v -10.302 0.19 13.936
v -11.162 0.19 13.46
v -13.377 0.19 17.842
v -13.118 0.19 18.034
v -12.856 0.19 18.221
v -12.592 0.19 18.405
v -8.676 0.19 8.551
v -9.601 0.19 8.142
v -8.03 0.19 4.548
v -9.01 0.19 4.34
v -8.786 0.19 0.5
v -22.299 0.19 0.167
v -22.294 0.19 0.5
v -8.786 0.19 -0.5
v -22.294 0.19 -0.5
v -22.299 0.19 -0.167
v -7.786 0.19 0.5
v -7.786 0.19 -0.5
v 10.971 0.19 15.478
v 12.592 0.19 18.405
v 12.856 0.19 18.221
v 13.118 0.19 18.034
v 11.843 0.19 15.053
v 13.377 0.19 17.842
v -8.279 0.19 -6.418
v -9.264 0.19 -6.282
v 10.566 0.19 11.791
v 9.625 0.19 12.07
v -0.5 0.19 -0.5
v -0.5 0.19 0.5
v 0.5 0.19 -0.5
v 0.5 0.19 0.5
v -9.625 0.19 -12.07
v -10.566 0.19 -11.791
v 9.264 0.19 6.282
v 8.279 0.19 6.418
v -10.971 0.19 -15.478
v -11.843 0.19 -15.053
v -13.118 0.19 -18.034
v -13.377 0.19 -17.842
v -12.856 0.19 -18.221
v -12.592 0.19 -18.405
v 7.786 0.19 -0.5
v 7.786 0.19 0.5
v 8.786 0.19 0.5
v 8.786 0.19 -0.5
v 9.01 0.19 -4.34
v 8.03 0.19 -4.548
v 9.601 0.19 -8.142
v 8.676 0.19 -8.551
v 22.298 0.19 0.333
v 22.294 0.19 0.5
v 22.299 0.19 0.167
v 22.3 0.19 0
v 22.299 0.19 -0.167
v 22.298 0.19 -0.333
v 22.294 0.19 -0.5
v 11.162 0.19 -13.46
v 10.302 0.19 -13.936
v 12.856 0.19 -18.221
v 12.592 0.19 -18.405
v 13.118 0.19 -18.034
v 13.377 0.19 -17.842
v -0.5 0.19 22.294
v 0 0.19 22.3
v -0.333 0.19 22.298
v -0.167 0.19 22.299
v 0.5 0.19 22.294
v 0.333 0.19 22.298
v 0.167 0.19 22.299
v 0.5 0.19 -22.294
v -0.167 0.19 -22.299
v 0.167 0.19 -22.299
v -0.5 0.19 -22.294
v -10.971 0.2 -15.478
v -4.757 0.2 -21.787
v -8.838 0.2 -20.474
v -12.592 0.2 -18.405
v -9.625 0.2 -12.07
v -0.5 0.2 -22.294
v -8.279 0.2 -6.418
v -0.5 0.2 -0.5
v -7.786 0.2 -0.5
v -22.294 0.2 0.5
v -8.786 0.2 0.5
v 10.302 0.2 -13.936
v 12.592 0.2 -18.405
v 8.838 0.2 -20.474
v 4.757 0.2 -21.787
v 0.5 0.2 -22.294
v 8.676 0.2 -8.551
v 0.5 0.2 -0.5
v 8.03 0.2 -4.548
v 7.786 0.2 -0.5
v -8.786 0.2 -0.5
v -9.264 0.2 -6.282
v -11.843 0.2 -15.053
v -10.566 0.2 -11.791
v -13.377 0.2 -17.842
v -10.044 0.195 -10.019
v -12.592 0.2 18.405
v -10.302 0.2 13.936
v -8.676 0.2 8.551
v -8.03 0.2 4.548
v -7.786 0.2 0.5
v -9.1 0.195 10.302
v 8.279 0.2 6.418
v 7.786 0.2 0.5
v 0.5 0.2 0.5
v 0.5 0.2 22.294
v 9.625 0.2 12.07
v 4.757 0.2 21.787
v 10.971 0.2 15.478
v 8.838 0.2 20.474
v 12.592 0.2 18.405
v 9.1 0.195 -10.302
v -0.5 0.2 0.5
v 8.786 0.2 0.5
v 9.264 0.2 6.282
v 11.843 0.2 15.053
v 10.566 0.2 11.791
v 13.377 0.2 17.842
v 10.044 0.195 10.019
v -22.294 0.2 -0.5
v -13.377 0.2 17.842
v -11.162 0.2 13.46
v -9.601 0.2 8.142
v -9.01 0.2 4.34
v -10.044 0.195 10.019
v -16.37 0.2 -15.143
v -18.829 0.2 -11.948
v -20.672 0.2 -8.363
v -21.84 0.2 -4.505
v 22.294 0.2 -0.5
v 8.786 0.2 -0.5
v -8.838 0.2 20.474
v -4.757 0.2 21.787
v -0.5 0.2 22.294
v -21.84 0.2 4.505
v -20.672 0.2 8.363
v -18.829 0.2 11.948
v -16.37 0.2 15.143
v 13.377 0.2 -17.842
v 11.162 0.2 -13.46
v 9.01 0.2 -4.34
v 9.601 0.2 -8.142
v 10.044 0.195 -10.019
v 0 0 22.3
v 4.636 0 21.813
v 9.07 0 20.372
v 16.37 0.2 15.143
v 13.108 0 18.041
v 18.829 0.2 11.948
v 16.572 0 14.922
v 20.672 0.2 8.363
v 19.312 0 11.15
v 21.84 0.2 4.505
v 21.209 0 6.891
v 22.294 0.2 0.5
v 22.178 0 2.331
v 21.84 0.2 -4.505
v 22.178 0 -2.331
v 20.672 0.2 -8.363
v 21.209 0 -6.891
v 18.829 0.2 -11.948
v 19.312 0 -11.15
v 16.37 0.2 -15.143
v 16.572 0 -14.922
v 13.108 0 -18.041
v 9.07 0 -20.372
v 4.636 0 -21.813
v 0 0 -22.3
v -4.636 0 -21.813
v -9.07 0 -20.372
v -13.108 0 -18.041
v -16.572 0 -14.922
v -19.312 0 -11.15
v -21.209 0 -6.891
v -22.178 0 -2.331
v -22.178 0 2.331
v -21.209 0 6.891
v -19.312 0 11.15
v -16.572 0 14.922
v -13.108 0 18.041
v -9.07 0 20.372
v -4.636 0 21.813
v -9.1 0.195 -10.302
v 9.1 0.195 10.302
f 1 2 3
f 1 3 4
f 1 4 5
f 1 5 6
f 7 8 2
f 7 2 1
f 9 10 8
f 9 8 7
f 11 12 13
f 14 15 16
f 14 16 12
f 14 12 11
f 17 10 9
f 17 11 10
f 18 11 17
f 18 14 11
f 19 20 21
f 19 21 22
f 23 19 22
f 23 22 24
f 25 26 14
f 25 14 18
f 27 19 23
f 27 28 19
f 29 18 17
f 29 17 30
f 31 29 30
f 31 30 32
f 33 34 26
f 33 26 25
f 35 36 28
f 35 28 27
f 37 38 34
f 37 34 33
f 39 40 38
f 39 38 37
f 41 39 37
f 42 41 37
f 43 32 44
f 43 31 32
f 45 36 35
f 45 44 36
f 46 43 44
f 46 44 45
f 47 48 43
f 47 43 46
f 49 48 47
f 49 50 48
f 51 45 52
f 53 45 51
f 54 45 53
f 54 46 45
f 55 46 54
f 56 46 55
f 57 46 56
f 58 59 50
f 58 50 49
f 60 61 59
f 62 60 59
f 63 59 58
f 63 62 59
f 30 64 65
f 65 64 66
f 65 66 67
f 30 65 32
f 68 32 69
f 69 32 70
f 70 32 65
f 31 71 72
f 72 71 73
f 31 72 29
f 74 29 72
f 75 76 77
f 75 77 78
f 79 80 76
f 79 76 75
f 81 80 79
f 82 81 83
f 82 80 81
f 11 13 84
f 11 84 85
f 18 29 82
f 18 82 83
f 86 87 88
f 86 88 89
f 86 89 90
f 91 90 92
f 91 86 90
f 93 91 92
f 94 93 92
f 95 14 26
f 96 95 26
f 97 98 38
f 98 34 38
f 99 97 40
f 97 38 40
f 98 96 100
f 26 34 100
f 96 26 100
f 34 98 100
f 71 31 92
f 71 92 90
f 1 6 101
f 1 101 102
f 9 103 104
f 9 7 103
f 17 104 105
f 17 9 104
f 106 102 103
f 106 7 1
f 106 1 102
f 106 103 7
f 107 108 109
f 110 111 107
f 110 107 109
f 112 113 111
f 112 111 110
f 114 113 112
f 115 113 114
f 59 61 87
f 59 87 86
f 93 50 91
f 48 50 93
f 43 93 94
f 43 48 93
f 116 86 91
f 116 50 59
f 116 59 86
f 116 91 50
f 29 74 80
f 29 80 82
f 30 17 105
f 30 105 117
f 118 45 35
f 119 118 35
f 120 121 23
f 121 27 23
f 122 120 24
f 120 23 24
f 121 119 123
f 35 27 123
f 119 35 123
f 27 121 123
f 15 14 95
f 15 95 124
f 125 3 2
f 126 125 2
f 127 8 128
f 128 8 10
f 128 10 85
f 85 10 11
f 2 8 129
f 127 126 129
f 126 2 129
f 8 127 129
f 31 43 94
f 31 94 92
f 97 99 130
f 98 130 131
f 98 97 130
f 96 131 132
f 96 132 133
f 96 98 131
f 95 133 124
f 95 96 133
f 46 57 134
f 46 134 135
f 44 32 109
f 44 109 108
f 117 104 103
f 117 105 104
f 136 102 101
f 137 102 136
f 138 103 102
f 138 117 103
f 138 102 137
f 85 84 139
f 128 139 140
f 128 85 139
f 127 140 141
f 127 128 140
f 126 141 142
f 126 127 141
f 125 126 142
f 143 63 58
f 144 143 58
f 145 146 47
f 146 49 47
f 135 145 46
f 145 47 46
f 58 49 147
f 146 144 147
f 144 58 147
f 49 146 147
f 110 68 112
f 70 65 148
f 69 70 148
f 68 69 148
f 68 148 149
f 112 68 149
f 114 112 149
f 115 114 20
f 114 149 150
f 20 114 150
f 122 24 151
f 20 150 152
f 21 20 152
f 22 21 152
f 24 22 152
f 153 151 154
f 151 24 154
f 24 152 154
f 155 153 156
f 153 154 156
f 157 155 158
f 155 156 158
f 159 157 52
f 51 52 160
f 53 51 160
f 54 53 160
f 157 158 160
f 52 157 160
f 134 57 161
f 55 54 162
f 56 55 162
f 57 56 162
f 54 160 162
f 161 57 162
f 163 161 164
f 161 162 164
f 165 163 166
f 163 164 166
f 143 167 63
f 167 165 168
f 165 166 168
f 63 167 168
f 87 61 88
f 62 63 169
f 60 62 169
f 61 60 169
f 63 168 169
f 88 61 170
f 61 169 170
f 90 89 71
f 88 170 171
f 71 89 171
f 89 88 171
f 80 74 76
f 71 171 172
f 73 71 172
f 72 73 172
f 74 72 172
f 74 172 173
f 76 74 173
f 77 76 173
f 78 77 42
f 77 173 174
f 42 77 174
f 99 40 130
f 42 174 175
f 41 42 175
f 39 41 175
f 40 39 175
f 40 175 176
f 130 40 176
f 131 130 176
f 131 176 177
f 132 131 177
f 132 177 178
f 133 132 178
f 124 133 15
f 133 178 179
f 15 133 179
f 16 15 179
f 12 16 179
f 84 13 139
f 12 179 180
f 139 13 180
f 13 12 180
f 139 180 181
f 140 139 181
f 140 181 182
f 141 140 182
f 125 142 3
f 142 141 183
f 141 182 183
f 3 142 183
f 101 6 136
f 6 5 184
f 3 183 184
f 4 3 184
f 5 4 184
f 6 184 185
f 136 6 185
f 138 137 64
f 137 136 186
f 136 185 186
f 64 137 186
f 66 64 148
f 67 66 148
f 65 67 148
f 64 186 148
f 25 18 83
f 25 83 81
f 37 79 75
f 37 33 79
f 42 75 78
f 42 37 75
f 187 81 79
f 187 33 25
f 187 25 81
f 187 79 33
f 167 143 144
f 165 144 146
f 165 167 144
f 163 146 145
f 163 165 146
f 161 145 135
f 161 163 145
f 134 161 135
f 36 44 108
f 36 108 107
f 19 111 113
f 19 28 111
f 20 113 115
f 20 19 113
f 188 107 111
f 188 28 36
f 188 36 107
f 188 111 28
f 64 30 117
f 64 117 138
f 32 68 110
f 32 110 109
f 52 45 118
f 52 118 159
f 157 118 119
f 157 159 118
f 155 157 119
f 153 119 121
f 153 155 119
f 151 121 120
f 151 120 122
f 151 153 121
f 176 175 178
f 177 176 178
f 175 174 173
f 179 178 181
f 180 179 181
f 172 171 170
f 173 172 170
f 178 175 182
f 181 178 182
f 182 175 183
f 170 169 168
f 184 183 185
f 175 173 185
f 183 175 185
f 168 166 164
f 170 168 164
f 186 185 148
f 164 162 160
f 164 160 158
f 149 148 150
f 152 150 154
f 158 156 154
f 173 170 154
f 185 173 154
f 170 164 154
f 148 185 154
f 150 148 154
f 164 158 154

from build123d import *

# Parameters (mm, degrees)
SKETCH1_R           = 22.3
BOSS_EXTRUDE1_DEPTH = 0.2
CUT_EXTRUDE1_START  = -0.01
SKETCH2_W           = 1
SKETCH2_H           = 1
CUT_EXTRUDE1_DEPTH  = 0.01


with BuildPart() as part:
    # Sketch1 → Boss-Extrude1 (new body)
    with BuildSketch(Plane(origin=(0, 0, 0), x_dir=(1, 0, 0), z_dir=(0, 1, 0))):
        with Locations(Location((0, 0, 0), (0, 0, 270))):
            Circle(SKETCH1_R)
    extrude(amount=BOSS_EXTRUDE1_DEPTH)

    # Sketch2 → Cut-Extrude1 (cut)
    with BuildSketch(Plane(origin=(0, 0.2, 0), x_dir=(1, 0, 0), z_dir=(0, 1, 0)).offset(CUT_EXTRUDE1_START)):
        with BuildLine():
            add(Edge.make_bspline(
                [(-7.785590959, 0.5), (-7.912713042, 11.228724898), (-12.591992017, 18.404666176)],
                knots=[4.732589507, 4.732589507, 4.732589507, 5.550703884, 5.550703884, 5.550703884], degree=2, weights=[1, 0.917496228, 1]))
            ThreePointArc((-12.591992017, 18.404666176), (-12.987412835, 18.127799311), (-13.376748201, 17.842438386))
            add(Edge.make_bspline(
                [(-8.785624057, 0.5), (-8.910774379, 10.945499623), (-13.376748201, 17.842438386)],
                knots=[4.733440053, 4.733440053, 4.733440053, 5.562190564, 5.562190564, 5.562190564], degree=2, weights=[1, 0.915368033, 1]))
            Line((-8.785624057, 0.5), (-7.785590959, 0.5))
        make_face()
        with BuildLine():
            add(Edge.make_bspline(
                [(-12.591992017, -18.404666176), (-7.912713042, -11.228724898), (-7.785590959, -0.5)],
                knots=[3.874074076, 3.874074076, 3.874074076, 4.692188454, 4.692188454, 4.692188454], degree=2, weights=[1, 0.917496228, 1]))
            Line((-7.785590959, -0.5), (-8.785624057, -0.5))
            add(Edge.make_bspline(
                [(-13.376748201, -17.842438386), (-8.910774379, -10.945499623), (-8.785624057, -0.5)],
                knots=[3.862587397, 3.862587397, 3.862587397, 4.691337908, 4.691337908, 4.691337908], degree=2, weights=[1, 0.915368033, 1]))
            ThreePointArc((-13.376748201, -17.842438386), (-12.987412835, -18.127799311), (-12.591992017, -18.404666176))
        make_face()
        with BuildLine():
            Line((8.785624057, -0.5), (7.785590959, -0.5))
            add(Edge.make_bspline(
                [(7.785590959, -0.5), (7.912713042, -11.228724898), (12.591992017, -18.404666176)],
                knots=[1.590996853, 1.590996853, 1.590996853, 2.409111231, 2.409111231, 2.409111231], degree=2, weights=[1, 0.917496228, 1]))
            ThreePointArc((12.591992017, -18.404666176), (12.987412835, -18.127799311), (13.376748201, -17.842438386))
            add(Edge.make_bspline(
                [(8.785624057, -0.5), (8.910774379, -10.945499623), (13.376748201, -17.842438386)],
                knots=[1.591847399, 1.591847399, 1.591847399, 2.42059791, 2.42059791, 2.42059791], degree=2, weights=[1, 0.915368033, 1]))
        make_face()
        with BuildLine():
            ThreePointArc((13.376748201, 17.842438386), (12.987412835, 18.127799311), (12.591992017, 18.404666176))
            add(Edge.make_bspline(
                [(12.591992017, 18.404666176), (7.912713042, 11.228724898), (7.785590959, 0.5)],
                knots=[0.732481423, 0.732481423, 0.732481423, 1.5505958, 1.5505958, 1.5505958], degree=2, weights=[1, 0.917496228, 1]))
            Line((7.785590959, 0.5), (8.785624057, 0.5))
            add(Edge.make_bspline(
                [(13.376748201, 17.842438386), (8.910774379, 10.945499623), (8.785624057, 0.5)],
                knots=[0.720994743, 0.720994743, 0.720994743, 1.549745255, 1.549745255, 1.549745255], degree=2, weights=[1, 0.915368033, 1]))
        make_face()
        with BuildLine():
            Line((22.294393914, 0.5), (8.785624057, 0.5))
            add(Edge.make_bspline(
                [(8.785624057, 0.5), (8.779633423, 0), (8.785624057, -0.5)],
                knots=[1.549745255, 1.549745255, 1.549745255, 1.591847399, 1.591847399, 1.591847399], degree=2, weights=[1, 0.999778434, 1]))
            Line((8.785624057, -0.5), (22.294393914, -0.5))
            ThreePointArc((22.294393914, -0.5), (22.298598434, -0.250015714), (22.3, 0))
            ThreePointArc((22.3, 0), (22.298598434, 0.250015714), (22.294393914, 0.5))
        make_face()
        with BuildLine():
            Line((8.785624057, 0.5), (7.785590959, 0.5))
            add(Edge.make_bspline(
                [(7.785590959, 0.5), (7.779666579, 0), (7.785590959, -0.5)],
                knots=[1.5505958, 1.5505958, 1.5505958, 1.590996853, 1.590996853, 1.590996853], degree=2, weights=[1, 0.999795976, 1]))
            Line((7.785590959, -0.5), (8.785624057, -0.5))
            add(Edge.make_bspline(
                [(8.785624057, 0.5), (8.779633423, 0), (8.785624057, -0.5)],
                knots=[1.549745255, 1.549745255, 1.549745255, 1.591847399, 1.591847399, 1.591847399], degree=2, weights=[1, 0.999778434, 1]))
        make_face()
        with BuildLine():
            Line((7.785590959, 0.5), (0.5, 0.5))
            Line((0.5, 0.5), (0.5, -0.5))
            Line((0.5, -0.5), (7.785590959, -0.5))
            add(Edge.make_bspline(
                [(7.785590959, 0.5), (7.779666579, 0), (7.785590959, -0.5)],
                knots=[1.5505958, 1.5505958, 1.5505958, 1.590996853, 1.590996853, 1.590996853], degree=2, weights=[1, 0.999795976, 1]))
        make_face()
        Rectangle(SKETCH2_W, SKETCH2_H)
        with BuildLine():
            Line((0.5, -22.294393914), (0.5, -0.5))
            Line((0.5, -0.5), (-0.5, -0.5))
            Line((-0.5, -0.5), (-0.5, -22.294393914))
            ThreePointArc((-0.5, -22.294393914), (0, -22.3), (0.5, -22.294393914))
        make_face()
        with BuildLine():
            Line((0.5, 0.5), (0.5, 22.294393914))
            ThreePointArc((0.5, 22.294393914), (0, 22.3), (-0.5, 22.294393914))
            Line((-0.5, 22.294393914), (-0.5, 0.5))
            Line((-0.5, 0.5), (0.5, 0.5))
        make_face()
        with BuildLine():
            Line((-0.5, -0.5), (-0.5, 0.5))
            Line((-0.5, 0.5), (-7.785590959, 0.5))
            add(Edge.make_bspline(
                [(-7.785590959, -0.5), (-7.779666579, 0), (-7.785590959, 0.5)],
                knots=[4.692188454, 4.692188454, 4.692188454, 4.732589507, 4.732589507, 4.732589507], degree=2, weights=[1, 0.999795976, 1]))
            Line((-7.785590959, -0.5), (-0.5, -0.5))
        make_face()
        with BuildLine():
            add(Edge.make_bspline(
                [(-7.785590959, -0.5), (-7.779666579, 0), (-7.785590959, 0.5)],
                knots=[4.692188454, 4.692188454, 4.692188454, 4.732589507, 4.732589507, 4.732589507], degree=2, weights=[1, 0.999795976, 1]))
            Line((-7.785590959, 0.5), (-8.785624057, 0.5))
            add(Edge.make_bspline(
                [(-8.785624057, -0.5), (-8.779633423, 0), (-8.785624057, 0.5)],
                knots=[4.691337908, 4.691337908, 4.691337908, 4.733440053, 4.733440053, 4.733440053], degree=2, weights=[1, 0.999778434, 1]))
            Line((-8.785624057, -0.5), (-7.785590959, -0.5))
        make_face()
        with BuildLine():
            add(Edge.make_bspline(
                [(-8.785624057, -0.5), (-8.779633423, 0), (-8.785624057, 0.5)],
                knots=[4.691337908, 4.691337908, 4.691337908, 4.733440053, 4.733440053, 4.733440053], degree=2, weights=[1, 0.999778434, 1]))
            Line((-8.785624057, 0.5), (-22.294393914, 0.5))
            ThreePointArc((-22.294393914, 0.5), (-22.3, 0), (-22.294393914, -0.5))
            Line((-22.294393914, -0.5), (-8.785624057, -0.5))
        make_face()
    extrude(amount=CUT_EXTRUDE1_DEPTH, mode=Mode.SUBTRACT)


solid = part.part
